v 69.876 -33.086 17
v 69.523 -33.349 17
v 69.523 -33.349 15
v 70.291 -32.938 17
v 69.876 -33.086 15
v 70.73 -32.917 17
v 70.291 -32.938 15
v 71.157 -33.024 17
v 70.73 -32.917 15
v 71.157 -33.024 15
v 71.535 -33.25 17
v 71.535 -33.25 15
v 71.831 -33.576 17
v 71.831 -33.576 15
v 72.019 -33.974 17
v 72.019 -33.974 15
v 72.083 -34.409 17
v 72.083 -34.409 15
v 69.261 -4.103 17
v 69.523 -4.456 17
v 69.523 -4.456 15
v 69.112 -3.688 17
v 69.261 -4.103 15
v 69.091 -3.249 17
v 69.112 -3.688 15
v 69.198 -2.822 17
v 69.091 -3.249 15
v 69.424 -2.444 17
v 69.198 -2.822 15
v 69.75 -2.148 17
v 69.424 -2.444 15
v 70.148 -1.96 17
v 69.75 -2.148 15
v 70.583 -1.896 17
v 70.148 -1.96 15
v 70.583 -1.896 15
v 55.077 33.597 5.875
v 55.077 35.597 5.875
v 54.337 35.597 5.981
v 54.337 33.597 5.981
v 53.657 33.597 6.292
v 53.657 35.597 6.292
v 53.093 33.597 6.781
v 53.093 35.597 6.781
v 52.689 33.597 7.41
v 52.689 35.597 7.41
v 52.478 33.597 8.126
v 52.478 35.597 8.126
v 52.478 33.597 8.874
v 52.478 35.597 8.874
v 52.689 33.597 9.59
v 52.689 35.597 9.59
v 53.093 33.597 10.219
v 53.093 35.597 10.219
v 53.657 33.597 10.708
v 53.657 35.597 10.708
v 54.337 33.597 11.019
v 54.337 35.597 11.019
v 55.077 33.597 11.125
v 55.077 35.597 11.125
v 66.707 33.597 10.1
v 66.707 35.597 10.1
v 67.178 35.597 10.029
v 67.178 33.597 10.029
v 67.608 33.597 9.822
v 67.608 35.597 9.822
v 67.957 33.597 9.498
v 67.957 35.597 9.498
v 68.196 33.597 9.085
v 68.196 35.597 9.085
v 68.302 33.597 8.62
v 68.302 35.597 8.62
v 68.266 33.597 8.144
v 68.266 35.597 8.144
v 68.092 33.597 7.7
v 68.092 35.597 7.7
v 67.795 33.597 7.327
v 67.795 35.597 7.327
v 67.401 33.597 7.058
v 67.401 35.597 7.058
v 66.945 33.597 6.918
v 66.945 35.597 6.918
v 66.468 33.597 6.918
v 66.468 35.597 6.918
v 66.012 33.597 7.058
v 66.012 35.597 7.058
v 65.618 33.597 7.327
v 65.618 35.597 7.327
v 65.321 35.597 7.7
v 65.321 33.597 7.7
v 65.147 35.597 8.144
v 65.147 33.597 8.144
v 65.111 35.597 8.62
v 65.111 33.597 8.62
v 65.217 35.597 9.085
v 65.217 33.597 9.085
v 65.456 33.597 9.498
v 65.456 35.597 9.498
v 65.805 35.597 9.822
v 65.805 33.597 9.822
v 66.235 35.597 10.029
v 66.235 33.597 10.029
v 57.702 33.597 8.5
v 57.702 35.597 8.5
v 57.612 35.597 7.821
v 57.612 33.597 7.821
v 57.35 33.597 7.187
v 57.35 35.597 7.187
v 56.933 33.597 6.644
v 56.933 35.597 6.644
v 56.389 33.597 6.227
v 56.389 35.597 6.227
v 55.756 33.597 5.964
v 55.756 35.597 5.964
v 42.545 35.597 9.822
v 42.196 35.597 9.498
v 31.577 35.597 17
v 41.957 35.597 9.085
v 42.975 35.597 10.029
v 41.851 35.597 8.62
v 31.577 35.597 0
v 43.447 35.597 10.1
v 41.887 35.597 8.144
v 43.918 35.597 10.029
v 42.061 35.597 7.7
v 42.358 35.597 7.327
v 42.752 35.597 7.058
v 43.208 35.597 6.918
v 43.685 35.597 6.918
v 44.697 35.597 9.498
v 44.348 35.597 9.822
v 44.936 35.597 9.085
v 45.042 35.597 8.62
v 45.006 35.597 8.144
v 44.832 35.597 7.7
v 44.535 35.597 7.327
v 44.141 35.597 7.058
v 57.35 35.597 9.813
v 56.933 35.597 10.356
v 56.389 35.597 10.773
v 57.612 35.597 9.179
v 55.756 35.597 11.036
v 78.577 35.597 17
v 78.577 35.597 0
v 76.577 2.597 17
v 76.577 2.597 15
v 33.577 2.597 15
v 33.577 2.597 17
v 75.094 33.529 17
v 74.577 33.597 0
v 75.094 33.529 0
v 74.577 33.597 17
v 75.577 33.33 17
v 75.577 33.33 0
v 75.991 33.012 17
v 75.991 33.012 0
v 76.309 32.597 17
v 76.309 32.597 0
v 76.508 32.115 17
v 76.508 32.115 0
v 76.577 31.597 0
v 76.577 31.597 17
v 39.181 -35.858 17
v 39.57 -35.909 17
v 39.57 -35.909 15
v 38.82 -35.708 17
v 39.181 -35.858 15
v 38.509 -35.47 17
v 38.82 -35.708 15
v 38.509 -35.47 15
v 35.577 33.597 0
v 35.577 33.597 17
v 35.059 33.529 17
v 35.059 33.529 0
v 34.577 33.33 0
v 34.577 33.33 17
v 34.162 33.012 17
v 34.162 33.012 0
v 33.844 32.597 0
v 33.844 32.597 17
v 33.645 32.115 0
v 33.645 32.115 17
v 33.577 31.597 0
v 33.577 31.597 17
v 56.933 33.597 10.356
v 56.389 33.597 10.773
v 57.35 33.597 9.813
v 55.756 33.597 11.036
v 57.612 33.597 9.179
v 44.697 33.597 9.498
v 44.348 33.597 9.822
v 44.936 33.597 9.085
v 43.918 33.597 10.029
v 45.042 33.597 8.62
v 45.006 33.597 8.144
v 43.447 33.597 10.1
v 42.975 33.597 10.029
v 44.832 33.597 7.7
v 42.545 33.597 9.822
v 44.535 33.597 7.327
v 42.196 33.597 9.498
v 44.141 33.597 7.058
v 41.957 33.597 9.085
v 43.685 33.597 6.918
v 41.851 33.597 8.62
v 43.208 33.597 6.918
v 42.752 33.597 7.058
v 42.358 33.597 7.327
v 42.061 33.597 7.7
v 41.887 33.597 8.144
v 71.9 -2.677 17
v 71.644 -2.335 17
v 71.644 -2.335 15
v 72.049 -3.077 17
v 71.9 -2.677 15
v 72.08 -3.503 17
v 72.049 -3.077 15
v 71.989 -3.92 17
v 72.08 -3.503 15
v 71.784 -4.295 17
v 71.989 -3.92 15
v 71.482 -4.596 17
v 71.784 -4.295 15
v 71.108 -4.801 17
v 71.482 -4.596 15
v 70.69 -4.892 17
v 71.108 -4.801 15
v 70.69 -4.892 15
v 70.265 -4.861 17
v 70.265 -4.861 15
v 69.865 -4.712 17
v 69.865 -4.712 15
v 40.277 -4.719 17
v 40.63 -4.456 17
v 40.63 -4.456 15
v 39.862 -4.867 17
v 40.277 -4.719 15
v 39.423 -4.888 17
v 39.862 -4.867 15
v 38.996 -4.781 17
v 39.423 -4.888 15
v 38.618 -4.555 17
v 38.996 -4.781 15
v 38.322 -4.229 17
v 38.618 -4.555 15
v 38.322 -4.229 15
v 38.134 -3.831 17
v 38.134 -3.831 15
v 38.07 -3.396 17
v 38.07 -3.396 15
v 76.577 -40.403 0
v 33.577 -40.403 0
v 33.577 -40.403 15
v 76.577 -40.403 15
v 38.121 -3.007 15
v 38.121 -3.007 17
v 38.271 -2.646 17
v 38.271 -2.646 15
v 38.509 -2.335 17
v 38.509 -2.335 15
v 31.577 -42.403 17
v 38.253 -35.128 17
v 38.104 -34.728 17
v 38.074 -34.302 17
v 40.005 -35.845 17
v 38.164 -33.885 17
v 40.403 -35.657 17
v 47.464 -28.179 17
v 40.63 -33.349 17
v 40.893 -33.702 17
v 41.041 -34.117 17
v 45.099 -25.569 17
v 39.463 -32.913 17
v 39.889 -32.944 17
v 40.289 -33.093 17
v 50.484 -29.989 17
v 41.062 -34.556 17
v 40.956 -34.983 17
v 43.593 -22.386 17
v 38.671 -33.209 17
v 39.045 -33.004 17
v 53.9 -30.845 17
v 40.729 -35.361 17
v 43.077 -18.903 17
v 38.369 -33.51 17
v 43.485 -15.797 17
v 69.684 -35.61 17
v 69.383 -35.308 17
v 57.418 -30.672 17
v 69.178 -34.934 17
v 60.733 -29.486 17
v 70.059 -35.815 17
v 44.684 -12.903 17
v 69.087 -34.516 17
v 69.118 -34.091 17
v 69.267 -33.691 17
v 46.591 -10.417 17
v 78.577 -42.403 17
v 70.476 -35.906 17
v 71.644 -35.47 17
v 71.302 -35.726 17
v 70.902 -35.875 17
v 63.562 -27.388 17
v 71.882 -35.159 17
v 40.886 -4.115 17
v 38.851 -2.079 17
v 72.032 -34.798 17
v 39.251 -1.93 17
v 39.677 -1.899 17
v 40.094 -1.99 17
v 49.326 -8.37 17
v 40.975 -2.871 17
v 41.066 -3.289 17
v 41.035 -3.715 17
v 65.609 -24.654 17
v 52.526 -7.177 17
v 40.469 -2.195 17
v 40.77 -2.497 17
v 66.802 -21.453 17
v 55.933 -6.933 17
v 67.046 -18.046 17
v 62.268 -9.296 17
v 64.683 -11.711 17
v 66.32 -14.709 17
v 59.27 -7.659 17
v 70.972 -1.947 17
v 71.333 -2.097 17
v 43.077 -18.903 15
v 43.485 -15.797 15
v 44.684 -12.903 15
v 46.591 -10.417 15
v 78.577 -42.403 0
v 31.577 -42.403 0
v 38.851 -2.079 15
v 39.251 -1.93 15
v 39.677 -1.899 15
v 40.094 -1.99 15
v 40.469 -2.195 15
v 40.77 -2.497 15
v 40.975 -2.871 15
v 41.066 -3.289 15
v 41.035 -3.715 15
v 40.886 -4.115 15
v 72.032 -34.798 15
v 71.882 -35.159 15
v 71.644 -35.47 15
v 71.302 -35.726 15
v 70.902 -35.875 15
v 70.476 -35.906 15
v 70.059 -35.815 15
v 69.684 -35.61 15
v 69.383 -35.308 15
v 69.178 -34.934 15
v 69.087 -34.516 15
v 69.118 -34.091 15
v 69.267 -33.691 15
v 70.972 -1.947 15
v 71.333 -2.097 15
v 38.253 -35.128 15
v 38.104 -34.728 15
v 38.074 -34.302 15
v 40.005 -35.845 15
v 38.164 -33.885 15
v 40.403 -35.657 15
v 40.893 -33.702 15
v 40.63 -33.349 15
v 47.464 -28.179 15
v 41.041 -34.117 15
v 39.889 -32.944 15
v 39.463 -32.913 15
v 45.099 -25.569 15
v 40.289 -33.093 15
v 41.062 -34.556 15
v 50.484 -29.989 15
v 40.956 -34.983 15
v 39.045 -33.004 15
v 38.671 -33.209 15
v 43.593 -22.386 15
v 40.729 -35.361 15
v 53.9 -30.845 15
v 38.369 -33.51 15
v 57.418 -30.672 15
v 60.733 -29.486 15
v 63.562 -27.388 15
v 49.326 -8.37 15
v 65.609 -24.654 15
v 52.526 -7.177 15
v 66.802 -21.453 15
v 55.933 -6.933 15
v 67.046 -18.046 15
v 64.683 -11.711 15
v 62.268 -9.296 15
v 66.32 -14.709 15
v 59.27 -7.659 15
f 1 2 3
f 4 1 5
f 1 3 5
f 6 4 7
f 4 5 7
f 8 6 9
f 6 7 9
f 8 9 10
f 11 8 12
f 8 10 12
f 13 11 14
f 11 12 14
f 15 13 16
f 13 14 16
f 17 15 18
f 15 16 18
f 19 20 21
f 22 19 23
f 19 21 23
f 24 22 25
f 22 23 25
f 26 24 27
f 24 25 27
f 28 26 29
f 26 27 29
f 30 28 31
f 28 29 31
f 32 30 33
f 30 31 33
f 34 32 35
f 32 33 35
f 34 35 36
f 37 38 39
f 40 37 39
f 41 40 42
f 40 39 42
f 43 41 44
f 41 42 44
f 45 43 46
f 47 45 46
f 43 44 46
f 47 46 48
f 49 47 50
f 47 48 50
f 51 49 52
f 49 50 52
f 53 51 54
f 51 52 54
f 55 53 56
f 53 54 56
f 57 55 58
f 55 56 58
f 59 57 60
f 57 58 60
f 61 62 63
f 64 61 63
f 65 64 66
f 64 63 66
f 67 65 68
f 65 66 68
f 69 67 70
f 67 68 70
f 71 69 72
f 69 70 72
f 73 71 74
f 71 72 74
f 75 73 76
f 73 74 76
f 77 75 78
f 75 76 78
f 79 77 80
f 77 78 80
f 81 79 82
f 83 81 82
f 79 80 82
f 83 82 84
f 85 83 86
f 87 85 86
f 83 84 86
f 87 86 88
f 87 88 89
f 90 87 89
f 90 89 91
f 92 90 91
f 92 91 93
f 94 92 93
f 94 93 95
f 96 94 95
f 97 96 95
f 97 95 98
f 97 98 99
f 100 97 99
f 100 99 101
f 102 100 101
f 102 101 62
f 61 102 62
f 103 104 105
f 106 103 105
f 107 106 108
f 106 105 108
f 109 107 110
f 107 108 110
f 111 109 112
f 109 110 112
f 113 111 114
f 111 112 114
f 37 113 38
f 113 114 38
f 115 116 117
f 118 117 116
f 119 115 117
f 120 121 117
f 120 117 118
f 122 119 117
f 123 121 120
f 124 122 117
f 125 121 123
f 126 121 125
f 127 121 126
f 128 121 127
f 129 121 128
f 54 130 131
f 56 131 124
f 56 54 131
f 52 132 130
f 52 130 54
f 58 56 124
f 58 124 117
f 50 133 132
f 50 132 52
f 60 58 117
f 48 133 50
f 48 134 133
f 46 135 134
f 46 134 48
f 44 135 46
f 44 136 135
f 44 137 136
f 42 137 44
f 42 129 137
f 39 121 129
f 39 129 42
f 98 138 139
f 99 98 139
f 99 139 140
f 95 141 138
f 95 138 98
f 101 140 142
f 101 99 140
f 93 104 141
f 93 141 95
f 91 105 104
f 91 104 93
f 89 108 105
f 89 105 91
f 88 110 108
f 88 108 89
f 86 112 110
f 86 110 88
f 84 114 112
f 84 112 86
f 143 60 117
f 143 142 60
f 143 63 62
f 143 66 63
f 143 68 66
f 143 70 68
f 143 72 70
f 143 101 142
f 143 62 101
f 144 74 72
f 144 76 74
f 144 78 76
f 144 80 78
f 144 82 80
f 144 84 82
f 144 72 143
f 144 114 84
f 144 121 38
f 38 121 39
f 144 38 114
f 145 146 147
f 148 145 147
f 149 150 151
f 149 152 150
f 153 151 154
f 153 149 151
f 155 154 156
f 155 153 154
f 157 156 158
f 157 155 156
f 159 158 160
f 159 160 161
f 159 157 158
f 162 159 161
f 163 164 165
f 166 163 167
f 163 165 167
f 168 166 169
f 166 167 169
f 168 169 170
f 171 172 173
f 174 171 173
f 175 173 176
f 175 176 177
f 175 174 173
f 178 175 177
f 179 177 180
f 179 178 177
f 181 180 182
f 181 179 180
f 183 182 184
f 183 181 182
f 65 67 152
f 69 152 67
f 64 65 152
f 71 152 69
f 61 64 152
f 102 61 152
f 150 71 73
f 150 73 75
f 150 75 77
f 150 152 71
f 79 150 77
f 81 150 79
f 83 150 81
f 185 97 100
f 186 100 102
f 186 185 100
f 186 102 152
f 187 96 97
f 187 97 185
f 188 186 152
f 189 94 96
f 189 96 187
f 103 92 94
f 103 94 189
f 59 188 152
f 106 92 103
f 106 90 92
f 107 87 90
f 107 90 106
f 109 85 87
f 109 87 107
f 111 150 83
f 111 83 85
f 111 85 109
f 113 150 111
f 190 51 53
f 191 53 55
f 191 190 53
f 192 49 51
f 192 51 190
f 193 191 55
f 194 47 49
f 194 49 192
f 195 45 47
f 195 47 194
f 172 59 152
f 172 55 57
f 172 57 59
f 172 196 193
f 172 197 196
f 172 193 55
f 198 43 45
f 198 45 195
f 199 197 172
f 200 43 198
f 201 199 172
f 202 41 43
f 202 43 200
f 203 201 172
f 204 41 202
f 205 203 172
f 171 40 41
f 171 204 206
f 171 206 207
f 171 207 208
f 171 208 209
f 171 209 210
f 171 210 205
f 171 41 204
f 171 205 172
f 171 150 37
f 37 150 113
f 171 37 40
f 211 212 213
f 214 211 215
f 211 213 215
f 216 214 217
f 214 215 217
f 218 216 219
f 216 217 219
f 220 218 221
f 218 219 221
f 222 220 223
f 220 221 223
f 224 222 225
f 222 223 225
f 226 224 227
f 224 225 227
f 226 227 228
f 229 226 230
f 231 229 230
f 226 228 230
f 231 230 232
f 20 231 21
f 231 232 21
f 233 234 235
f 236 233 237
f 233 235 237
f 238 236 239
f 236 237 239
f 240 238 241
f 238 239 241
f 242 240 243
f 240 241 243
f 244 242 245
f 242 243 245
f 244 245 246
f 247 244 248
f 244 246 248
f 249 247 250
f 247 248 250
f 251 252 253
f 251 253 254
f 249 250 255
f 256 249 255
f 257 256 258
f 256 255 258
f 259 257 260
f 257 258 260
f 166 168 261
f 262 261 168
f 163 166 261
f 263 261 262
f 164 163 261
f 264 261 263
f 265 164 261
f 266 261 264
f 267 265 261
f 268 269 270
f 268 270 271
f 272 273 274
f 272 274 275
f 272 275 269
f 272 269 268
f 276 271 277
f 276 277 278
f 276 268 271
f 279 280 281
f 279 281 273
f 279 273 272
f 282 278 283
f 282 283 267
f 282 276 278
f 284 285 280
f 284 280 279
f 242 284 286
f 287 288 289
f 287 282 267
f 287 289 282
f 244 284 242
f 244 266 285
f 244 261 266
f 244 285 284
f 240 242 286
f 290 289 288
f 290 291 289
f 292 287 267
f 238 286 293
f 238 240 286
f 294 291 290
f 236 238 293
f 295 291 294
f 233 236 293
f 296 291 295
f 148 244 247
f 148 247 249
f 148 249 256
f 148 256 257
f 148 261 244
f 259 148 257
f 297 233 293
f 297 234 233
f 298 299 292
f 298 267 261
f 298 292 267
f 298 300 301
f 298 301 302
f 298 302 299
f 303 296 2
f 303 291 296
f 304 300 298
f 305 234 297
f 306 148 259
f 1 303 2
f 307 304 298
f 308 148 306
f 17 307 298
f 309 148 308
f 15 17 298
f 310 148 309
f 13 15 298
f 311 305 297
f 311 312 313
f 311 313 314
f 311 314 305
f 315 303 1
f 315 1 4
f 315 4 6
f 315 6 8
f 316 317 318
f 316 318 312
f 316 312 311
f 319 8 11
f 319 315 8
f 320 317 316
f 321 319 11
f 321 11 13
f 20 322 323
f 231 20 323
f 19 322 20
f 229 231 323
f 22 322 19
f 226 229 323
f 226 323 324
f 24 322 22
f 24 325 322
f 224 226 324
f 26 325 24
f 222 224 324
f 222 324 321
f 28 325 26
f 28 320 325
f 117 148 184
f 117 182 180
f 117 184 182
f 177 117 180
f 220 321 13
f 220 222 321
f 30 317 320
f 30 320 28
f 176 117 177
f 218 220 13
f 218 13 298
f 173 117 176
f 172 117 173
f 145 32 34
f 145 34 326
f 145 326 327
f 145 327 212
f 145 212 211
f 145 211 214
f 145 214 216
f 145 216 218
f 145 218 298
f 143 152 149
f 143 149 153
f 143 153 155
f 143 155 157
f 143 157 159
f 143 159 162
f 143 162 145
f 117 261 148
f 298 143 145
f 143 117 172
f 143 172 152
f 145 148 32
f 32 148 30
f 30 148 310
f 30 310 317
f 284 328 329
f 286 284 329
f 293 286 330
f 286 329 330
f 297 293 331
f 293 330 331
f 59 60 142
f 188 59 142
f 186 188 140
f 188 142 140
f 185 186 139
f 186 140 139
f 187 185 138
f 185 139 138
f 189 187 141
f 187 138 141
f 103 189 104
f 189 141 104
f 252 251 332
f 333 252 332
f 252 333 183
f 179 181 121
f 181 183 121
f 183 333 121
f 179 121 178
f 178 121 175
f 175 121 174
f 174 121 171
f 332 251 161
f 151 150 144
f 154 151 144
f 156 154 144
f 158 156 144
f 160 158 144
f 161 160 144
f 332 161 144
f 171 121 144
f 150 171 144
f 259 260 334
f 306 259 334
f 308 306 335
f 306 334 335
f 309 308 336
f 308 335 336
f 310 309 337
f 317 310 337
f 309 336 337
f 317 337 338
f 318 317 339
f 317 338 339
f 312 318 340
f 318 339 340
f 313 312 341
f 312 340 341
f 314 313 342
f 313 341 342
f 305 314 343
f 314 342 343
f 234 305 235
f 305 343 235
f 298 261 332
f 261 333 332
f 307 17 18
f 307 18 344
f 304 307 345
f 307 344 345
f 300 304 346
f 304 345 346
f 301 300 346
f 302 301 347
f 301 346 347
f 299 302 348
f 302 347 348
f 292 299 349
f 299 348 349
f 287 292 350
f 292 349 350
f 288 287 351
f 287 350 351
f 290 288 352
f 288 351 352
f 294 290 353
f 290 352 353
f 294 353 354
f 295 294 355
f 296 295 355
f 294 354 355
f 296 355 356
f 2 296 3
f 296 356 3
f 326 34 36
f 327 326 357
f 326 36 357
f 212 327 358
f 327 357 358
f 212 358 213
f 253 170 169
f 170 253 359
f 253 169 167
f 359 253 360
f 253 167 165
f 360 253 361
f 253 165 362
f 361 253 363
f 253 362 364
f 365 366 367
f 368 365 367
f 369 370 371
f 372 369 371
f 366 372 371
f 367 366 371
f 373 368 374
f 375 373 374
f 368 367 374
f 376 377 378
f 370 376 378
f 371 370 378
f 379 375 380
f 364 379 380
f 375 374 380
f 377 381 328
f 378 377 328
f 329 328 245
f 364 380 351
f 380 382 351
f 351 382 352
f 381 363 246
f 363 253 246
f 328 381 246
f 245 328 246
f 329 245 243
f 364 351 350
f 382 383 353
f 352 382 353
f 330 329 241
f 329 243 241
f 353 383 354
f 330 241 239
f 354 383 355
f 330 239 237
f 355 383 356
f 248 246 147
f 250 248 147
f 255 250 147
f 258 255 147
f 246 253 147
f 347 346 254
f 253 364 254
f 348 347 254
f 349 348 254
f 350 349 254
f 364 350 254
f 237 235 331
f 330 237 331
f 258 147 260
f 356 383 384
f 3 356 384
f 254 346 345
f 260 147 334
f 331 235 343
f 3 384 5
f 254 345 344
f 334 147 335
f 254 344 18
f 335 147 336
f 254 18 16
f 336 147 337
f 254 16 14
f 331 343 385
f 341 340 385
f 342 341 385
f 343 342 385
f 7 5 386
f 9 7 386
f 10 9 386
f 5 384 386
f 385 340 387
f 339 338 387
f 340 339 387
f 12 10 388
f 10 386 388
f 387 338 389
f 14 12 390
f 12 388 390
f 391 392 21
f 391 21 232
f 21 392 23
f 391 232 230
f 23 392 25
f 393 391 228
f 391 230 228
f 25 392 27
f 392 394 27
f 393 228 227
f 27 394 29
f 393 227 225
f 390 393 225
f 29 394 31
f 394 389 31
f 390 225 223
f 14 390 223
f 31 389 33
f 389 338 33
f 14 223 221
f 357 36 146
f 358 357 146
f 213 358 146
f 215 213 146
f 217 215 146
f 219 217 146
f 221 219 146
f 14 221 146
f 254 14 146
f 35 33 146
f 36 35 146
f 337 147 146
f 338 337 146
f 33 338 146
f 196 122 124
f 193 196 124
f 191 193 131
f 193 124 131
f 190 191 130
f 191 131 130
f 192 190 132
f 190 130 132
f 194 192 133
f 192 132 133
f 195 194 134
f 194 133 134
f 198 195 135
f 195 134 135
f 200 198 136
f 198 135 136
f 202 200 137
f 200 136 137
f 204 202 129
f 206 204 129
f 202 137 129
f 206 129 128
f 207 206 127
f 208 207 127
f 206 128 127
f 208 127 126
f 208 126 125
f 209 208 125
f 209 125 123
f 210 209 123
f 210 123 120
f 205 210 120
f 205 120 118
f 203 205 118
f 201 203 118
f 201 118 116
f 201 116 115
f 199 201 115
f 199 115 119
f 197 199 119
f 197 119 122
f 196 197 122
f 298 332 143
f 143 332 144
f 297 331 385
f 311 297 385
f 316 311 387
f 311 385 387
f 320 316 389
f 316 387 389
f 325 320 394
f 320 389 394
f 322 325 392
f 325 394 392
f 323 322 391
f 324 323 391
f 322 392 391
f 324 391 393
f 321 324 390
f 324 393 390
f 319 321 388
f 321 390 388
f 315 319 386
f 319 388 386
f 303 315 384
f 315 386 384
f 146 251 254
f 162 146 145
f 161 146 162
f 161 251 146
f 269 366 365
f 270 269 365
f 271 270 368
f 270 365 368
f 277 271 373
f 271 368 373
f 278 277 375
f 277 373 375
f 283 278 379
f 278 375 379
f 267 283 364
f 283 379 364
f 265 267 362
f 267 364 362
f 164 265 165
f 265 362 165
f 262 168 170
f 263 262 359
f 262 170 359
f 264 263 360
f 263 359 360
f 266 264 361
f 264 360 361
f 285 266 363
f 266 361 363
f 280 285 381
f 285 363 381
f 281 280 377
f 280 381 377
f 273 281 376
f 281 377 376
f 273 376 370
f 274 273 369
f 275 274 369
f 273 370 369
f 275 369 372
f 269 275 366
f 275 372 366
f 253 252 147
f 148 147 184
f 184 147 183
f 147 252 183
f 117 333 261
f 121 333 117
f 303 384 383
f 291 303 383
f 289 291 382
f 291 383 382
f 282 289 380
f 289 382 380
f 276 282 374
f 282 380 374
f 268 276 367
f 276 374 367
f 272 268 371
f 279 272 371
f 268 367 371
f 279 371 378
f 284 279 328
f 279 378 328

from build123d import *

# Parameters (mm, degrees)
SKETCH1_W           = 47
SKETCH1_H           = 78
SKETCH1_W_2         = 43
SKETCH1_H_2         = 74
EXTRUDE_THIN1_DEPTH = 15
SKETCH6_W           = 47
SKETCH6_H           = 78
BOSS_EXTRUDE1_DEPTH = 2
SKETCH8_W           = 43
SKETCH8_H           = 31
CUT_EXTRUDE1_DEPTH  = 10
CUT_EXTRUDE2_DEPTH  = 10
CUT_EXTRUDE3_DEPTH  = 10
CIRPATTERN1_COUNT   = 4
SKETCH12_R          = 1.6
CUT_EXTRUDE4_DEPTH  = 10
FILLET1_R           = 2


with BuildPart() as part:
    # Sketch1 → Extrude-Thin1 (new body)
    with BuildSketch(Plane.XY):
        with Locations((55.076537335, -3.402525622)):
            Rectangle(SKETCH1_W, SKETCH1_H)
        with Locations((55.076537335, -3.402525622)):
            Rectangle(SKETCH1_W_2, SKETCH1_H_2, mode=Mode.SUBTRACT)
    extrude(amount=EXTRUDE_THIN1_DEPTH)

    # Sketch6 → Boss-Extrude1 (add)
    with BuildSketch(Plane.XY.offset(15)):
        with Locations((55.076537335, -3.402525622)):
            Rectangle(SKETCH6_W, SKETCH6_H)
    extrude(amount=BOSS_EXTRUDE1_DEPTH)

    # Sketch8 → Cut-Extrude1 (cut)
    with BuildSketch(Plane(origin=(0, 0, 15), x_dir=(-1, 0, 0), z_dir=(0, 0, -1))):
        with Locations((-55.076537335, 18.097474378)):
            Rectangle(SKETCH8_W, SKETCH8_H)
    extrude(amount=-CUT_EXTRUDE1_DEPTH, mode=Mode.SUBTRACT)

    # Sketch9 → Cut-Extrude2 (cut)
    with BuildSketch(Plane(origin=(0, 0, 15), x_dir=(-1, 0, 0), z_dir=(0, 0, -1))):
        with BuildLine():
            ThreePointArc((-43.076537335, -18.902525622), (-43.989982945, -14.310324434), (-46.591255961, -10.417244248))
            Line((-46.591255961, -10.417244248), (-63.56181871, -27.387806996))
            ThreePointArc((-63.56181871, -27.387806996), (-50.484336147, -29.989080012), (-43.076537335, -18.902525622))
        make_face()
        with BuildLine():
            Line((-63.56181871, -27.387806996), (-46.591255961, -10.417244248))
            ThreePointArc((-46.591255961, -10.417244248), (-63.56181871, -10.417244248), (-63.56181871, -27.387806996))
        make_face()
    extrude(amount=-CUT_EXTRUDE2_DEPTH, mode=Mode.SUBTRACT)

    # Sketch11 → Cut-Extrude3 (cut)
    with BuildSketch(Plane(origin=(0, 0, 15), x_dir=(-1, 0, 0), z_dir=(0, 0, -1))):
        with BuildLine():
            ThreePointArc((-38.069685624, -3.395673911), (-38.183866325, -2.821648762), (-38.509025452, -2.335013739))
            Line((-38.509025452, -2.335013739), (-40.630345796, -4.456334083))
            ThreePointArc((-40.630345796, -4.456334083), (-38.995660475, -4.78149321), (-38.069685624, -3.395673911))
        make_face()
        with BuildLine():
            Line((-40.630345796, -4.456334083), (-38.509025452, -2.335013739))
            ThreePointArc((-38.509025452, -2.335013739), (-40.630345796, -2.335013739), (-40.630345796, -4.456334083))
        make_face()
    cut_extrude3 = extrude(amount=-CUT_EXTRUDE3_DEPTH, mode=Mode.SUBTRACT)

    # CirPattern1: Cut-Extrude3 ×4 about axis
    cirpattern1_axis = Axis((55.076537335, -18.902525622, 0), (0, 0, 1))
    for i in range(1, CIRPATTERN1_COUNT):
        add(cut_extrude3.rotate(cirpattern1_axis, i * 360 / CIRPATTERN1_COUNT), mode=Mode.SUBTRACT)

    # Sketch12 → Cut-Extrude4 (cut)
    with BuildSketch(Plane(origin=(0, 35.597474378, 0), x_dir=(1, 0, 0), z_dir=(0, 1, 0))):
        with BuildLine():
            ThreePointArc((55.076537335, -5.875), (52.451537335, -8.5), (55.076537335, -11.125))
            Line((55.076537335, -11.125), (55.076537335, -5.875))
        make_face()
        with BuildLine():
            Line((55.076537335, -5.875), (55.076537335, -11.125))
            ThreePointArc((55.076537335, -11.125), (56.932692636, -10.356155301), (57.701537335, -8.5))
            ThreePointArc((57.701537335, -8.5), (56.932692636, -6.643844699), (55.076537335, -5.875))
        make_face()
        with Locations(Location((43.446537335, -8.5, 0), (0, 0, 270))):
            Circle(SKETCH12_R)
        with Locations(Location((66.706537335, -8.5, 0), (0, 0, 270))):
            Circle(SKETCH12_R)
    extrude(amount=-CUT_EXTRUDE4_DEPTH, mode=Mode.SUBTRACT)

    # Fillet1
    fillet1_edges = [part.edges().sort_by_distance(p)[0] for p in [
        (33.576537335, 33.597474378, 8.5),
        (76.576537335, 33.597474378, 8.5),
    ]]
    fillet(fillet1_edges, radius=FILLET1_R)


solid = part.part
